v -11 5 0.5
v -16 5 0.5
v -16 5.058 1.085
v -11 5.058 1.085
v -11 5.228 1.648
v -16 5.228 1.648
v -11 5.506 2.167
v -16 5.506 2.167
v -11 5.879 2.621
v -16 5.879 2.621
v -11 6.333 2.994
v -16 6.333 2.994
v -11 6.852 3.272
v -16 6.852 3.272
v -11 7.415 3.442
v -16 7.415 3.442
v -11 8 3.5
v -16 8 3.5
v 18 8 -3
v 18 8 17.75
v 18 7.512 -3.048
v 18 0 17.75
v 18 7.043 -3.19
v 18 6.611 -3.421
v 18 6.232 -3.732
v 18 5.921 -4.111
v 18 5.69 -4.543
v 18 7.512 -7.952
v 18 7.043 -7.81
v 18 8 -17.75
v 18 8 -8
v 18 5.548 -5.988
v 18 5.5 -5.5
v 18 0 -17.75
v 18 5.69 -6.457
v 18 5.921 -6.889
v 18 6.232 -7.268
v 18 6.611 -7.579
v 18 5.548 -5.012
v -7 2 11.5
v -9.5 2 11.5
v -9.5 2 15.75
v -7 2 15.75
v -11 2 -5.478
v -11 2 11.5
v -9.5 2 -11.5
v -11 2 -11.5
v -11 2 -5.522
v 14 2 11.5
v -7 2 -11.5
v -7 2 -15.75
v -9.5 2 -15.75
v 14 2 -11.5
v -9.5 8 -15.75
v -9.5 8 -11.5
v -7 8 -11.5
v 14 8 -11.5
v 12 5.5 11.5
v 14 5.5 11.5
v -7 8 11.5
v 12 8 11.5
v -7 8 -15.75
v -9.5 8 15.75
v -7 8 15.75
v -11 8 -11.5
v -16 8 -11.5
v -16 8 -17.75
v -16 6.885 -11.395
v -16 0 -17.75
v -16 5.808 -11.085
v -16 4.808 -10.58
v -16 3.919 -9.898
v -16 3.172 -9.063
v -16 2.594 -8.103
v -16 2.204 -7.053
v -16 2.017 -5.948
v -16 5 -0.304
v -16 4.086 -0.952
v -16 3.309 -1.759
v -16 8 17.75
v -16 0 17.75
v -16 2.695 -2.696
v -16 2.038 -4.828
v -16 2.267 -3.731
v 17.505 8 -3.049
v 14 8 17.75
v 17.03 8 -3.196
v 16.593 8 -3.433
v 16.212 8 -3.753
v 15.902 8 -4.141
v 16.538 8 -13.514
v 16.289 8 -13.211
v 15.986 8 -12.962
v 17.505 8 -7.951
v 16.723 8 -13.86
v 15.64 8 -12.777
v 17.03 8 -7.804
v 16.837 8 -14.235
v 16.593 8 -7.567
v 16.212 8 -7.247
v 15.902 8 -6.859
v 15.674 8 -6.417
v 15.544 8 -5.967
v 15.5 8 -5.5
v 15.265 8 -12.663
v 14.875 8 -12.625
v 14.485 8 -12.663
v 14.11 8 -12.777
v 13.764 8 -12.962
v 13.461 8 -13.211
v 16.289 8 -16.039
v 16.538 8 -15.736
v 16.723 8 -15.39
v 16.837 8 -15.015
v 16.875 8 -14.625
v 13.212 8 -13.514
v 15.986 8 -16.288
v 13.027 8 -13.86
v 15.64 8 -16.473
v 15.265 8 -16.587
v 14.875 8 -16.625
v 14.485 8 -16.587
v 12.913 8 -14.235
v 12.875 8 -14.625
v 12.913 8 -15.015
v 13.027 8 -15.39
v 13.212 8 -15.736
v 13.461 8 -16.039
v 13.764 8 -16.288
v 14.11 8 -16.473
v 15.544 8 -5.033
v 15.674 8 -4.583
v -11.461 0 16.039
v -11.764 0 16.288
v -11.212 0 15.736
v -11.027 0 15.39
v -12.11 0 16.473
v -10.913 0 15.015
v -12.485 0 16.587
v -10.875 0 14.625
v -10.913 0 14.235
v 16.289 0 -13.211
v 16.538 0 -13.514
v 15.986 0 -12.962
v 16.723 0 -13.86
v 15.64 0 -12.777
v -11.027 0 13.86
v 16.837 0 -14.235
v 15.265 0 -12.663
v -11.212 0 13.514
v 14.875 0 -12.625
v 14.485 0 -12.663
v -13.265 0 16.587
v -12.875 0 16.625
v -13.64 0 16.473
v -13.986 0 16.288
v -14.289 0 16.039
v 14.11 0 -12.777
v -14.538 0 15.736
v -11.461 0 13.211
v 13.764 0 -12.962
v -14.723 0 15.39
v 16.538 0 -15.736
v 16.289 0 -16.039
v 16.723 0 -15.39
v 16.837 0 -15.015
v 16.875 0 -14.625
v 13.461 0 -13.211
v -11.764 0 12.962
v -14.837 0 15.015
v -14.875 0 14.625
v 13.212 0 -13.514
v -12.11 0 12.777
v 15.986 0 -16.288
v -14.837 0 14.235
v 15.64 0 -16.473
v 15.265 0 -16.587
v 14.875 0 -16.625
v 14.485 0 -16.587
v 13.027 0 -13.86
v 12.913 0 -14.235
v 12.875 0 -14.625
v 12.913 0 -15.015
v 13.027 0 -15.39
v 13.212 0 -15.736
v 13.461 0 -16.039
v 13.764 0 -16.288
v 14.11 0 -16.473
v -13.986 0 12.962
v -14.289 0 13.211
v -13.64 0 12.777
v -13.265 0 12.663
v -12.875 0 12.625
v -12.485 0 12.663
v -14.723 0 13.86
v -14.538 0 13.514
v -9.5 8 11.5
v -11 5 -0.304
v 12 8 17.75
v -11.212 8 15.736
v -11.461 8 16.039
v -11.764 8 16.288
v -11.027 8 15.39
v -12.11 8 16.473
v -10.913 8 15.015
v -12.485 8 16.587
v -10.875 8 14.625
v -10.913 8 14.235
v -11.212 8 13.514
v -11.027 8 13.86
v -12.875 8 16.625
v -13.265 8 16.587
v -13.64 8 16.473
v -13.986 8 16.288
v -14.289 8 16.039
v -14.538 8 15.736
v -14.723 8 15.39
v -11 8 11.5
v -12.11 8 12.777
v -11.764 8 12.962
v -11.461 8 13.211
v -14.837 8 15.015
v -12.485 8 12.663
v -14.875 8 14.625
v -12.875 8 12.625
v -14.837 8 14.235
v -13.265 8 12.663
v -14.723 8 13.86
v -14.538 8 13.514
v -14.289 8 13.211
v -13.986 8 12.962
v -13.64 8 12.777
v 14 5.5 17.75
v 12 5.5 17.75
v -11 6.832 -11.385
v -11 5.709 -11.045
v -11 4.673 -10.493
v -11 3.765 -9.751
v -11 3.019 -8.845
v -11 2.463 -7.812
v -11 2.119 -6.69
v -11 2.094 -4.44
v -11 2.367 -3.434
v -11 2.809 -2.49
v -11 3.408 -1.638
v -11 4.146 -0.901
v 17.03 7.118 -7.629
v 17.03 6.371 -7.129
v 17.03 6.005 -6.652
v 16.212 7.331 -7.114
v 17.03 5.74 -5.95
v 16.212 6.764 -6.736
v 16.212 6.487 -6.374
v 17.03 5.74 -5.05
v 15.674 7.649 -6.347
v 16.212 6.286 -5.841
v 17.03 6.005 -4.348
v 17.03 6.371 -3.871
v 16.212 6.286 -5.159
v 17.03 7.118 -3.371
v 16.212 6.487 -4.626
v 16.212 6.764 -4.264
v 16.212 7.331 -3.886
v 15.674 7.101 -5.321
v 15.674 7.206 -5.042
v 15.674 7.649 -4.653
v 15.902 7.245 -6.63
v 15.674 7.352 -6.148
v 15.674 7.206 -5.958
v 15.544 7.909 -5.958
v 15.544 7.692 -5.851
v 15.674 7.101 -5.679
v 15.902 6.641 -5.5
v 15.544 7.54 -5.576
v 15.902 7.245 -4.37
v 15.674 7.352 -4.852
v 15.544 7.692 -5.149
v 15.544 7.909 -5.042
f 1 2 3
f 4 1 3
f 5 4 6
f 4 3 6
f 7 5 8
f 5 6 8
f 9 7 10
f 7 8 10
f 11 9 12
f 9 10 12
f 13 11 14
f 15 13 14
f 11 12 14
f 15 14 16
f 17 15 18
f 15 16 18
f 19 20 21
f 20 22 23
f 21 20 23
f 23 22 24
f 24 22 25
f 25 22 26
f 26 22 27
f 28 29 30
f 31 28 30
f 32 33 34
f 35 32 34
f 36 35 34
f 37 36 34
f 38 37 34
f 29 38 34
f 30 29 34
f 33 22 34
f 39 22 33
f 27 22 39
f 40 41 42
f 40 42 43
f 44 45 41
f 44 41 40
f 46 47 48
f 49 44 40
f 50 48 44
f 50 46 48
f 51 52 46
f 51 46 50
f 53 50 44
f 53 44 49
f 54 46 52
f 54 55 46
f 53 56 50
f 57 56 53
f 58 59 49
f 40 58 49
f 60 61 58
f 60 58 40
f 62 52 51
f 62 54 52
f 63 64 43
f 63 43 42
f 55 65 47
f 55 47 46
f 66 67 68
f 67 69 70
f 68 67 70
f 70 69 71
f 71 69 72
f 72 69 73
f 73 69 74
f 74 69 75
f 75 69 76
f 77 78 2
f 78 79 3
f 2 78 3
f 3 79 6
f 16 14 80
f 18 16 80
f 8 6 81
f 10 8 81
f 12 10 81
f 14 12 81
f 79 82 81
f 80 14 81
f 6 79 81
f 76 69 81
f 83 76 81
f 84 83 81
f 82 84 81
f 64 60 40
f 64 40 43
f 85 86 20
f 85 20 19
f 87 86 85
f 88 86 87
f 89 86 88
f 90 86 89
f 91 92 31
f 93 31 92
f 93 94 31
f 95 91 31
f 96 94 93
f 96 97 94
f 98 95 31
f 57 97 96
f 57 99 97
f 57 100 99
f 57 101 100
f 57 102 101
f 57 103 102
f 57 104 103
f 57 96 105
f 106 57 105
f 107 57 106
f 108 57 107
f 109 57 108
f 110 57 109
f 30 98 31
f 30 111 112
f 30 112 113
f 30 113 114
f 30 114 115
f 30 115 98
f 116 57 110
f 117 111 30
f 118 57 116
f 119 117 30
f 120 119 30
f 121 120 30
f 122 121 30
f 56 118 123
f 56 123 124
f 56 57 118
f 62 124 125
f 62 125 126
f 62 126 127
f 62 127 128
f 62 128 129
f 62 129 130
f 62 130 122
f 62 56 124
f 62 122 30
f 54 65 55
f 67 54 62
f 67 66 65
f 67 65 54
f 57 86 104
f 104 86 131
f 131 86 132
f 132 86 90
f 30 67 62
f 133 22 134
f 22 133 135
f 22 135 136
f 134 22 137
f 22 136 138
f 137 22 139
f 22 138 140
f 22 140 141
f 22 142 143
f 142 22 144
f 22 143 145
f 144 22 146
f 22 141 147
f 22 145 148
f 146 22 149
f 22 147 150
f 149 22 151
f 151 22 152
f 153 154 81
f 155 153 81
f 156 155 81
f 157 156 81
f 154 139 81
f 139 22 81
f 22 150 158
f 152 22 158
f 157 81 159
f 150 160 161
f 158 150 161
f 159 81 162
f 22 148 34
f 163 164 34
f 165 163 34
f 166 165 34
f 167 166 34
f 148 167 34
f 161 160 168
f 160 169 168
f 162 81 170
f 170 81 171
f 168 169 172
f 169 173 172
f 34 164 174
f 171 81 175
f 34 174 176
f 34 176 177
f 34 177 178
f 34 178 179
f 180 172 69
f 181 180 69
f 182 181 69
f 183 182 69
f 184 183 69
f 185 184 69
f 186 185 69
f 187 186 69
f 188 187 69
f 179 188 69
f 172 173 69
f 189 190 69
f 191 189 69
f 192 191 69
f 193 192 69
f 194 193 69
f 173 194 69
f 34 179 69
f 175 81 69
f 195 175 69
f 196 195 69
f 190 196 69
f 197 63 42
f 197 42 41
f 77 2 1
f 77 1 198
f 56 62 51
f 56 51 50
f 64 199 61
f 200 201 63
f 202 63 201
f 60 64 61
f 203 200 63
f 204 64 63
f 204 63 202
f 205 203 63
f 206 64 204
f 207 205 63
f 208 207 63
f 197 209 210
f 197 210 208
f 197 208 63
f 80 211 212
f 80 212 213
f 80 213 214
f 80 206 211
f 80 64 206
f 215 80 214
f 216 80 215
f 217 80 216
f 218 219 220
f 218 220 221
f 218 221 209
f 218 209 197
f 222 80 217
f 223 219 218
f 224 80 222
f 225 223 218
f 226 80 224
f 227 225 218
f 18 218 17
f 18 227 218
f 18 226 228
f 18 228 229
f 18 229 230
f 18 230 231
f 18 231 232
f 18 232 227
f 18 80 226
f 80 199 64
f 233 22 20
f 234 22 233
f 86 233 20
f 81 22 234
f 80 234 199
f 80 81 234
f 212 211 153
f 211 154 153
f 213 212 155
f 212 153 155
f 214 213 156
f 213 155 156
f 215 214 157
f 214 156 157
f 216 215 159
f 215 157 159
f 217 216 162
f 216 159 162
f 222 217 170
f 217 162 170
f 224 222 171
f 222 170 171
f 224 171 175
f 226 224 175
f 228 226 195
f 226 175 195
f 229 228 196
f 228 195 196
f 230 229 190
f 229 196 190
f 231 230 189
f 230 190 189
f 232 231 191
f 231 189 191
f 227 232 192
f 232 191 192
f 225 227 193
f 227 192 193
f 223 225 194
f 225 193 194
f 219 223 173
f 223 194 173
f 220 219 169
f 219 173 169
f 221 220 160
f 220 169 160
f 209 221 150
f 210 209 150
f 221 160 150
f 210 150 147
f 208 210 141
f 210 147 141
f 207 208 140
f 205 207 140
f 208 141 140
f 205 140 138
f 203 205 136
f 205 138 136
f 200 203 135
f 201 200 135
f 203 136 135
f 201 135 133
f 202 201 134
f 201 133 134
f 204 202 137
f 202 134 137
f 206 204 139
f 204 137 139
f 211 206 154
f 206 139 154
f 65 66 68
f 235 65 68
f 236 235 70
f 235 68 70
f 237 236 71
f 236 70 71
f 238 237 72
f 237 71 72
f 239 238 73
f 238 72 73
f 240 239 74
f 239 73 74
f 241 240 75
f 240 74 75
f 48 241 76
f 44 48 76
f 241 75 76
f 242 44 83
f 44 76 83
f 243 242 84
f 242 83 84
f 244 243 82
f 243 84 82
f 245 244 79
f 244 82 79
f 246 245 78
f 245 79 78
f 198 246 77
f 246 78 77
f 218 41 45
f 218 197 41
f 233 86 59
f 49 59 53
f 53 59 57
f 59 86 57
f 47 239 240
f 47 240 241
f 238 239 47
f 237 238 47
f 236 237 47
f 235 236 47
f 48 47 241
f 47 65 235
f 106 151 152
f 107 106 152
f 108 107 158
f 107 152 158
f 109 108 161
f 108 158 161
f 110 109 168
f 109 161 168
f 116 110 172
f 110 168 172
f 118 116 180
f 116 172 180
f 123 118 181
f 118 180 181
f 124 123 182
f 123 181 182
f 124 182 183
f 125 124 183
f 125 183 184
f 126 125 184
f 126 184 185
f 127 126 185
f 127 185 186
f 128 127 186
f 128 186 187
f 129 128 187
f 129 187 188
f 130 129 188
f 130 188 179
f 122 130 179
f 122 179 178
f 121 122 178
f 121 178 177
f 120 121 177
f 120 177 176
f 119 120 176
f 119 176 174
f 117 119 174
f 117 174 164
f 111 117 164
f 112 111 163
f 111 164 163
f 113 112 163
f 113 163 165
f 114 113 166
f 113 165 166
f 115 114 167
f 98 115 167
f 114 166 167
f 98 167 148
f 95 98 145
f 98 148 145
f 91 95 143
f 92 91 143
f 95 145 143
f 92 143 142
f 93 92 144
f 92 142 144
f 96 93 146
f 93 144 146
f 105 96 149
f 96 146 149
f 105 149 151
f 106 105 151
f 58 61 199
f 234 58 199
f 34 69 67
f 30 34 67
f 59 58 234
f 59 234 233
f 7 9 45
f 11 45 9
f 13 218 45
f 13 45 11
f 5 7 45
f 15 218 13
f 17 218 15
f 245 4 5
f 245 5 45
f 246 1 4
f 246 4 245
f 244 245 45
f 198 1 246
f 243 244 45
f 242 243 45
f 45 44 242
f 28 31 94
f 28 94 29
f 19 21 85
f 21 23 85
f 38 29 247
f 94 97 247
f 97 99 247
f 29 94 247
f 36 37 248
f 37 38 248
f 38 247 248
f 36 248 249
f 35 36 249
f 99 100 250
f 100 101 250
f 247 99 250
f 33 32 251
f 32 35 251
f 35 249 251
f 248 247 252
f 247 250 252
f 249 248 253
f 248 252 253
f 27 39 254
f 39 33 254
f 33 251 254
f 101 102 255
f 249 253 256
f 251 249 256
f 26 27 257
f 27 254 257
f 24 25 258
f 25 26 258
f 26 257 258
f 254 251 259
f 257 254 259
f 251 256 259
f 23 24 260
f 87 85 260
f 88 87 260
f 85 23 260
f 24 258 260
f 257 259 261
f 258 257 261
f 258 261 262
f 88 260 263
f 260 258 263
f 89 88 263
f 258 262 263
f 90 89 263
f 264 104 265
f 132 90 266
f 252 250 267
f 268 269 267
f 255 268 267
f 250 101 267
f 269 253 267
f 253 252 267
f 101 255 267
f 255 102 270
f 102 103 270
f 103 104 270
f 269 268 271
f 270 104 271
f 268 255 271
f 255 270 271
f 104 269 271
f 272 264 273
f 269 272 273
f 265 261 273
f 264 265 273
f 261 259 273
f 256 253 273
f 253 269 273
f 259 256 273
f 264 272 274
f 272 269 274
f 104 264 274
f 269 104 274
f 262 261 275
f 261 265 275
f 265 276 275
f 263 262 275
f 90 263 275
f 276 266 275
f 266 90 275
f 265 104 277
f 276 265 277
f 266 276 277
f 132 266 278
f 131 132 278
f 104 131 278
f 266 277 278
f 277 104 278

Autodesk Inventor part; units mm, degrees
ref_plane "YZ Plane" through (0, 0, 0) normal (1, 0, 0) x (0, 1, 0)
ref_plane "XZ Plane" through (0, 0, 0) normal (0, 1, 0) x (-1, 0, 0)
ref_plane "XY Plane" through (0, 0, 0) normal (0, 0, 1) x (1, 0, 0)
sketch "Sketch1" plane through (0, 0, 0) normal (0, 1, 0) x (-1, 0, 0)
  line L0 (16, 17.75) -> (-16, 17.75)
  line L1 (-16, 17.75) -> (-16, -17.75)
  line L2 (-16, -17.75) -> (16, -17.75)
  line L3 (16, -17.75) -> (16, 17.75)
  line L4 (16, 17.75) -> (-16, -17.75) construction
  line L5 (-16, 17.75) -> (16, -17.75) construction
  point P0 (0, 0)
  dimension "d0" = 32
  dimension "d1" = 35.5
extrude "Extrusion1" add sketch "Sketch1" along normal blind 8
sketch "Sketch2" plane through (0, 8, 0) normal (0, 1, 0) x (1, 0, 0)
  line L0 (-11, 11.5) -> (14, 11.5)
  line L1 (14, 11.5) -> (14, -11.5)
  line L2 (14, -11.5) -> (-11, -11.5)
  line L3 (-11, -11.5) -> (-11, 11.5)
  line L4 (-11, 11.5) -> (14, -11.5) construction
  line L5 (14, 11.5) -> (-11, -11.5) construction
  line L6 (16, -17.75) -> (16, 17.75) projected
  point P0 (0, 0)
  point P1 (1.5, 0)
  dimension "d4" = 0
  dimension "d5" = 2
  dimension "d6" = 25
  dimension "d13" = 23
extrude "Extrusion2" cut sketch "Sketch2" against normal blind 6
sketch "Sketch3" plane through (0, 8, 0) normal (0, 1, 0) x (1, 0, 0)
  line L0 (-7, -15.75) -> (-9.5, -15.75)
  line L1 (-9.5, -15.75) -> (-9.5, 15.75)
  line L2 (-9.5, 15.75) -> (-7, 15.75)
  line L3 (-7, 15.75) -> (-7, -15.75)
  line L4 (-7, -15.75) -> (-9.5, 15.75) construction
  line L5 (-9.5, -15.75) -> (-7, 15.75) construction
  line L6 (14, 11.5) -> (14, -11.5) projected
  point P0 (0, 0)
  point P1 (-8.25, 0)
  dimension "d9" = 21
  dimension "d10" = 2.5
  dimension "d11" = 0
  dimension "d12" = 31.5
extrude "Extrusion3" cut sketch "Sketch3" against normal blind 6
sketch "Sketch4" plane through (-16, 0, -17.75) normal (-1, 0, 0) x (0, 0, 1)
  line L0 (6.25, 8) -> (6.25, 2) projected
  line L1 (6.25, 8) -> (29.25, 8) projected
  line L2 (6.25, 2) -> (29.25, 2) projected
  line L3 (18.25, 5) -> (17.4462, 5)
  line L4 (18.25, 11) -> (17.4462, 11)
  arc A0 (18.25, 5) -> (18.25, 11) centre (18.25, 8) ccw
  arc A1 (17.4462, 11) -> (17.4462, 5) centre (12.25, 8) ccw
  arc A2 (18.25, 8) -> (17.5, 10.9047) centre (12.25, 8) ccw
  point P0 (17.75, 0)
  dimension "d17" = 6
extrude "Extrusion4" cut sketch "Sketch4" against normal up to surface (30 mm away) contours A1 L4 A0 L1 | L1 A0 L3 A1
thicken "Thicken1" operation add thickness 2 both sides no extend neighbours yes toward (1, 0, 0) faces at (16, 5.3333, 5.9167)
sketch "Sketch6" plane through (18, 0, 17.75) normal (1, 0, 0) x (0, 0, -1)
  arc A0 (18.0538, 5) -> (29.25, 8) centre (23.25, 8) ccw projected
  circle A1 centre (23.25, 8) radius 2.5
  point P0 (17.75, 0)
  dimension "d26" = 5
extrude "Extrusion6" cut sketch "Sketch6" against normal blind 2.5
fillet "Fillet2" radius 2.5 1 edges at (15.5, 5.5, -5.5)
sketch "Sketch7" plane through (0, 8, 0) normal (0, 1, 0) x (1, 0, 0)
  arc A0 (18, 8) -> (18, 3) centre (18, 5.5) ccw projected
  line L0 (18, 8) -> (18, 17.75) projected
  line L1 (18, 17.75) -> (-16, 17.75) projected
  line L2 (-16, 17.75) -> (-16, 11.5) projected
  line L3 (-16, 11.5) -> (-11, 11.5) projected
  line L4 (-11, 11.5) -> (-9.5, 11.5) projected
  line L5 (-9.5, 11.5) -> (-9.5, 15.75) projected
  line L6 (-9.5, 15.75) -> (-7, 15.75) projected
  line L7 (-7, 15.75) -> (-7, 11.5) projected
  line L8 (-7, 11.5) -> (14, 11.5) projected
  line L9 (14, 11.5) -> (14, -11.5) projected
  line L10 (14, -11.5) -> (-7, -11.5) projected
  line L11 (-7, -11.5) -> (-7, -15.75) projected
  line L12 (-7, -15.75) -> (-9.5, -15.75) projected
  line L13 (-9.5, -15.75) -> (-9.5, -11.5) projected
  line L14 (-9.5, -11.5) -> (-11, -11.5) projected
  line L15 (-11, -11.5) -> (-11, -3.5) projected
  line L16 (-11, -3.5) -> (-16, -3.5) projected
  line L17 (-16, -3.5) -> (-16, -17.75) projected
  line L18 (-16, -17.75) -> (18, -17.75) projected
  line L19 (18, -17.75) -> (18, 3) projected
  line L20 (-16, -17.75) -> (18, -17.75) projected
  line L21 (14, -11.5) -> (12, -11.5)
  line L22 (12, -11.5) -> (12, -17.75)
  line L23 (12, -17.75) -> (14, -17.75)
  line L24 (14, -17.75) -> (14, -11.5)
  point P0 (0, 0)
  dimension "d30" = 2
extrude "Extrusion7" cut sketch "Sketch7" against normal blind 2.5 contours L18 L22 L10 L24
sketch "Sketch8" plane through (0, 8, 0) normal (0, 1, 0) x (1, 0, 0)
  line L0 (18, 17.75) -> (-16, 17.75) projected
  line L1 (18, 8) -> (18, 17.75) projected
  line L2 (-16, -17.75) -> (12, -17.75) projected
  line L3 (-16, -3.5) -> (-16, -17.75) projected
  point P0 (0, 0)
  point P1 (14.875, 14.625)
  point P2 (-12.875, -14.625)
  dimension "d33" = 3.125
  dimension "d34" = 3.125
  dimension "d35" = 3.125
  dimension "d36" = 3.125
hole "Hole1" at (14.875, 8, -14.625) at (-12.875, 8, 14.625) direction (0, -1, 0) diameter 4 end through all
properties part number "knee_motor_hemi"
